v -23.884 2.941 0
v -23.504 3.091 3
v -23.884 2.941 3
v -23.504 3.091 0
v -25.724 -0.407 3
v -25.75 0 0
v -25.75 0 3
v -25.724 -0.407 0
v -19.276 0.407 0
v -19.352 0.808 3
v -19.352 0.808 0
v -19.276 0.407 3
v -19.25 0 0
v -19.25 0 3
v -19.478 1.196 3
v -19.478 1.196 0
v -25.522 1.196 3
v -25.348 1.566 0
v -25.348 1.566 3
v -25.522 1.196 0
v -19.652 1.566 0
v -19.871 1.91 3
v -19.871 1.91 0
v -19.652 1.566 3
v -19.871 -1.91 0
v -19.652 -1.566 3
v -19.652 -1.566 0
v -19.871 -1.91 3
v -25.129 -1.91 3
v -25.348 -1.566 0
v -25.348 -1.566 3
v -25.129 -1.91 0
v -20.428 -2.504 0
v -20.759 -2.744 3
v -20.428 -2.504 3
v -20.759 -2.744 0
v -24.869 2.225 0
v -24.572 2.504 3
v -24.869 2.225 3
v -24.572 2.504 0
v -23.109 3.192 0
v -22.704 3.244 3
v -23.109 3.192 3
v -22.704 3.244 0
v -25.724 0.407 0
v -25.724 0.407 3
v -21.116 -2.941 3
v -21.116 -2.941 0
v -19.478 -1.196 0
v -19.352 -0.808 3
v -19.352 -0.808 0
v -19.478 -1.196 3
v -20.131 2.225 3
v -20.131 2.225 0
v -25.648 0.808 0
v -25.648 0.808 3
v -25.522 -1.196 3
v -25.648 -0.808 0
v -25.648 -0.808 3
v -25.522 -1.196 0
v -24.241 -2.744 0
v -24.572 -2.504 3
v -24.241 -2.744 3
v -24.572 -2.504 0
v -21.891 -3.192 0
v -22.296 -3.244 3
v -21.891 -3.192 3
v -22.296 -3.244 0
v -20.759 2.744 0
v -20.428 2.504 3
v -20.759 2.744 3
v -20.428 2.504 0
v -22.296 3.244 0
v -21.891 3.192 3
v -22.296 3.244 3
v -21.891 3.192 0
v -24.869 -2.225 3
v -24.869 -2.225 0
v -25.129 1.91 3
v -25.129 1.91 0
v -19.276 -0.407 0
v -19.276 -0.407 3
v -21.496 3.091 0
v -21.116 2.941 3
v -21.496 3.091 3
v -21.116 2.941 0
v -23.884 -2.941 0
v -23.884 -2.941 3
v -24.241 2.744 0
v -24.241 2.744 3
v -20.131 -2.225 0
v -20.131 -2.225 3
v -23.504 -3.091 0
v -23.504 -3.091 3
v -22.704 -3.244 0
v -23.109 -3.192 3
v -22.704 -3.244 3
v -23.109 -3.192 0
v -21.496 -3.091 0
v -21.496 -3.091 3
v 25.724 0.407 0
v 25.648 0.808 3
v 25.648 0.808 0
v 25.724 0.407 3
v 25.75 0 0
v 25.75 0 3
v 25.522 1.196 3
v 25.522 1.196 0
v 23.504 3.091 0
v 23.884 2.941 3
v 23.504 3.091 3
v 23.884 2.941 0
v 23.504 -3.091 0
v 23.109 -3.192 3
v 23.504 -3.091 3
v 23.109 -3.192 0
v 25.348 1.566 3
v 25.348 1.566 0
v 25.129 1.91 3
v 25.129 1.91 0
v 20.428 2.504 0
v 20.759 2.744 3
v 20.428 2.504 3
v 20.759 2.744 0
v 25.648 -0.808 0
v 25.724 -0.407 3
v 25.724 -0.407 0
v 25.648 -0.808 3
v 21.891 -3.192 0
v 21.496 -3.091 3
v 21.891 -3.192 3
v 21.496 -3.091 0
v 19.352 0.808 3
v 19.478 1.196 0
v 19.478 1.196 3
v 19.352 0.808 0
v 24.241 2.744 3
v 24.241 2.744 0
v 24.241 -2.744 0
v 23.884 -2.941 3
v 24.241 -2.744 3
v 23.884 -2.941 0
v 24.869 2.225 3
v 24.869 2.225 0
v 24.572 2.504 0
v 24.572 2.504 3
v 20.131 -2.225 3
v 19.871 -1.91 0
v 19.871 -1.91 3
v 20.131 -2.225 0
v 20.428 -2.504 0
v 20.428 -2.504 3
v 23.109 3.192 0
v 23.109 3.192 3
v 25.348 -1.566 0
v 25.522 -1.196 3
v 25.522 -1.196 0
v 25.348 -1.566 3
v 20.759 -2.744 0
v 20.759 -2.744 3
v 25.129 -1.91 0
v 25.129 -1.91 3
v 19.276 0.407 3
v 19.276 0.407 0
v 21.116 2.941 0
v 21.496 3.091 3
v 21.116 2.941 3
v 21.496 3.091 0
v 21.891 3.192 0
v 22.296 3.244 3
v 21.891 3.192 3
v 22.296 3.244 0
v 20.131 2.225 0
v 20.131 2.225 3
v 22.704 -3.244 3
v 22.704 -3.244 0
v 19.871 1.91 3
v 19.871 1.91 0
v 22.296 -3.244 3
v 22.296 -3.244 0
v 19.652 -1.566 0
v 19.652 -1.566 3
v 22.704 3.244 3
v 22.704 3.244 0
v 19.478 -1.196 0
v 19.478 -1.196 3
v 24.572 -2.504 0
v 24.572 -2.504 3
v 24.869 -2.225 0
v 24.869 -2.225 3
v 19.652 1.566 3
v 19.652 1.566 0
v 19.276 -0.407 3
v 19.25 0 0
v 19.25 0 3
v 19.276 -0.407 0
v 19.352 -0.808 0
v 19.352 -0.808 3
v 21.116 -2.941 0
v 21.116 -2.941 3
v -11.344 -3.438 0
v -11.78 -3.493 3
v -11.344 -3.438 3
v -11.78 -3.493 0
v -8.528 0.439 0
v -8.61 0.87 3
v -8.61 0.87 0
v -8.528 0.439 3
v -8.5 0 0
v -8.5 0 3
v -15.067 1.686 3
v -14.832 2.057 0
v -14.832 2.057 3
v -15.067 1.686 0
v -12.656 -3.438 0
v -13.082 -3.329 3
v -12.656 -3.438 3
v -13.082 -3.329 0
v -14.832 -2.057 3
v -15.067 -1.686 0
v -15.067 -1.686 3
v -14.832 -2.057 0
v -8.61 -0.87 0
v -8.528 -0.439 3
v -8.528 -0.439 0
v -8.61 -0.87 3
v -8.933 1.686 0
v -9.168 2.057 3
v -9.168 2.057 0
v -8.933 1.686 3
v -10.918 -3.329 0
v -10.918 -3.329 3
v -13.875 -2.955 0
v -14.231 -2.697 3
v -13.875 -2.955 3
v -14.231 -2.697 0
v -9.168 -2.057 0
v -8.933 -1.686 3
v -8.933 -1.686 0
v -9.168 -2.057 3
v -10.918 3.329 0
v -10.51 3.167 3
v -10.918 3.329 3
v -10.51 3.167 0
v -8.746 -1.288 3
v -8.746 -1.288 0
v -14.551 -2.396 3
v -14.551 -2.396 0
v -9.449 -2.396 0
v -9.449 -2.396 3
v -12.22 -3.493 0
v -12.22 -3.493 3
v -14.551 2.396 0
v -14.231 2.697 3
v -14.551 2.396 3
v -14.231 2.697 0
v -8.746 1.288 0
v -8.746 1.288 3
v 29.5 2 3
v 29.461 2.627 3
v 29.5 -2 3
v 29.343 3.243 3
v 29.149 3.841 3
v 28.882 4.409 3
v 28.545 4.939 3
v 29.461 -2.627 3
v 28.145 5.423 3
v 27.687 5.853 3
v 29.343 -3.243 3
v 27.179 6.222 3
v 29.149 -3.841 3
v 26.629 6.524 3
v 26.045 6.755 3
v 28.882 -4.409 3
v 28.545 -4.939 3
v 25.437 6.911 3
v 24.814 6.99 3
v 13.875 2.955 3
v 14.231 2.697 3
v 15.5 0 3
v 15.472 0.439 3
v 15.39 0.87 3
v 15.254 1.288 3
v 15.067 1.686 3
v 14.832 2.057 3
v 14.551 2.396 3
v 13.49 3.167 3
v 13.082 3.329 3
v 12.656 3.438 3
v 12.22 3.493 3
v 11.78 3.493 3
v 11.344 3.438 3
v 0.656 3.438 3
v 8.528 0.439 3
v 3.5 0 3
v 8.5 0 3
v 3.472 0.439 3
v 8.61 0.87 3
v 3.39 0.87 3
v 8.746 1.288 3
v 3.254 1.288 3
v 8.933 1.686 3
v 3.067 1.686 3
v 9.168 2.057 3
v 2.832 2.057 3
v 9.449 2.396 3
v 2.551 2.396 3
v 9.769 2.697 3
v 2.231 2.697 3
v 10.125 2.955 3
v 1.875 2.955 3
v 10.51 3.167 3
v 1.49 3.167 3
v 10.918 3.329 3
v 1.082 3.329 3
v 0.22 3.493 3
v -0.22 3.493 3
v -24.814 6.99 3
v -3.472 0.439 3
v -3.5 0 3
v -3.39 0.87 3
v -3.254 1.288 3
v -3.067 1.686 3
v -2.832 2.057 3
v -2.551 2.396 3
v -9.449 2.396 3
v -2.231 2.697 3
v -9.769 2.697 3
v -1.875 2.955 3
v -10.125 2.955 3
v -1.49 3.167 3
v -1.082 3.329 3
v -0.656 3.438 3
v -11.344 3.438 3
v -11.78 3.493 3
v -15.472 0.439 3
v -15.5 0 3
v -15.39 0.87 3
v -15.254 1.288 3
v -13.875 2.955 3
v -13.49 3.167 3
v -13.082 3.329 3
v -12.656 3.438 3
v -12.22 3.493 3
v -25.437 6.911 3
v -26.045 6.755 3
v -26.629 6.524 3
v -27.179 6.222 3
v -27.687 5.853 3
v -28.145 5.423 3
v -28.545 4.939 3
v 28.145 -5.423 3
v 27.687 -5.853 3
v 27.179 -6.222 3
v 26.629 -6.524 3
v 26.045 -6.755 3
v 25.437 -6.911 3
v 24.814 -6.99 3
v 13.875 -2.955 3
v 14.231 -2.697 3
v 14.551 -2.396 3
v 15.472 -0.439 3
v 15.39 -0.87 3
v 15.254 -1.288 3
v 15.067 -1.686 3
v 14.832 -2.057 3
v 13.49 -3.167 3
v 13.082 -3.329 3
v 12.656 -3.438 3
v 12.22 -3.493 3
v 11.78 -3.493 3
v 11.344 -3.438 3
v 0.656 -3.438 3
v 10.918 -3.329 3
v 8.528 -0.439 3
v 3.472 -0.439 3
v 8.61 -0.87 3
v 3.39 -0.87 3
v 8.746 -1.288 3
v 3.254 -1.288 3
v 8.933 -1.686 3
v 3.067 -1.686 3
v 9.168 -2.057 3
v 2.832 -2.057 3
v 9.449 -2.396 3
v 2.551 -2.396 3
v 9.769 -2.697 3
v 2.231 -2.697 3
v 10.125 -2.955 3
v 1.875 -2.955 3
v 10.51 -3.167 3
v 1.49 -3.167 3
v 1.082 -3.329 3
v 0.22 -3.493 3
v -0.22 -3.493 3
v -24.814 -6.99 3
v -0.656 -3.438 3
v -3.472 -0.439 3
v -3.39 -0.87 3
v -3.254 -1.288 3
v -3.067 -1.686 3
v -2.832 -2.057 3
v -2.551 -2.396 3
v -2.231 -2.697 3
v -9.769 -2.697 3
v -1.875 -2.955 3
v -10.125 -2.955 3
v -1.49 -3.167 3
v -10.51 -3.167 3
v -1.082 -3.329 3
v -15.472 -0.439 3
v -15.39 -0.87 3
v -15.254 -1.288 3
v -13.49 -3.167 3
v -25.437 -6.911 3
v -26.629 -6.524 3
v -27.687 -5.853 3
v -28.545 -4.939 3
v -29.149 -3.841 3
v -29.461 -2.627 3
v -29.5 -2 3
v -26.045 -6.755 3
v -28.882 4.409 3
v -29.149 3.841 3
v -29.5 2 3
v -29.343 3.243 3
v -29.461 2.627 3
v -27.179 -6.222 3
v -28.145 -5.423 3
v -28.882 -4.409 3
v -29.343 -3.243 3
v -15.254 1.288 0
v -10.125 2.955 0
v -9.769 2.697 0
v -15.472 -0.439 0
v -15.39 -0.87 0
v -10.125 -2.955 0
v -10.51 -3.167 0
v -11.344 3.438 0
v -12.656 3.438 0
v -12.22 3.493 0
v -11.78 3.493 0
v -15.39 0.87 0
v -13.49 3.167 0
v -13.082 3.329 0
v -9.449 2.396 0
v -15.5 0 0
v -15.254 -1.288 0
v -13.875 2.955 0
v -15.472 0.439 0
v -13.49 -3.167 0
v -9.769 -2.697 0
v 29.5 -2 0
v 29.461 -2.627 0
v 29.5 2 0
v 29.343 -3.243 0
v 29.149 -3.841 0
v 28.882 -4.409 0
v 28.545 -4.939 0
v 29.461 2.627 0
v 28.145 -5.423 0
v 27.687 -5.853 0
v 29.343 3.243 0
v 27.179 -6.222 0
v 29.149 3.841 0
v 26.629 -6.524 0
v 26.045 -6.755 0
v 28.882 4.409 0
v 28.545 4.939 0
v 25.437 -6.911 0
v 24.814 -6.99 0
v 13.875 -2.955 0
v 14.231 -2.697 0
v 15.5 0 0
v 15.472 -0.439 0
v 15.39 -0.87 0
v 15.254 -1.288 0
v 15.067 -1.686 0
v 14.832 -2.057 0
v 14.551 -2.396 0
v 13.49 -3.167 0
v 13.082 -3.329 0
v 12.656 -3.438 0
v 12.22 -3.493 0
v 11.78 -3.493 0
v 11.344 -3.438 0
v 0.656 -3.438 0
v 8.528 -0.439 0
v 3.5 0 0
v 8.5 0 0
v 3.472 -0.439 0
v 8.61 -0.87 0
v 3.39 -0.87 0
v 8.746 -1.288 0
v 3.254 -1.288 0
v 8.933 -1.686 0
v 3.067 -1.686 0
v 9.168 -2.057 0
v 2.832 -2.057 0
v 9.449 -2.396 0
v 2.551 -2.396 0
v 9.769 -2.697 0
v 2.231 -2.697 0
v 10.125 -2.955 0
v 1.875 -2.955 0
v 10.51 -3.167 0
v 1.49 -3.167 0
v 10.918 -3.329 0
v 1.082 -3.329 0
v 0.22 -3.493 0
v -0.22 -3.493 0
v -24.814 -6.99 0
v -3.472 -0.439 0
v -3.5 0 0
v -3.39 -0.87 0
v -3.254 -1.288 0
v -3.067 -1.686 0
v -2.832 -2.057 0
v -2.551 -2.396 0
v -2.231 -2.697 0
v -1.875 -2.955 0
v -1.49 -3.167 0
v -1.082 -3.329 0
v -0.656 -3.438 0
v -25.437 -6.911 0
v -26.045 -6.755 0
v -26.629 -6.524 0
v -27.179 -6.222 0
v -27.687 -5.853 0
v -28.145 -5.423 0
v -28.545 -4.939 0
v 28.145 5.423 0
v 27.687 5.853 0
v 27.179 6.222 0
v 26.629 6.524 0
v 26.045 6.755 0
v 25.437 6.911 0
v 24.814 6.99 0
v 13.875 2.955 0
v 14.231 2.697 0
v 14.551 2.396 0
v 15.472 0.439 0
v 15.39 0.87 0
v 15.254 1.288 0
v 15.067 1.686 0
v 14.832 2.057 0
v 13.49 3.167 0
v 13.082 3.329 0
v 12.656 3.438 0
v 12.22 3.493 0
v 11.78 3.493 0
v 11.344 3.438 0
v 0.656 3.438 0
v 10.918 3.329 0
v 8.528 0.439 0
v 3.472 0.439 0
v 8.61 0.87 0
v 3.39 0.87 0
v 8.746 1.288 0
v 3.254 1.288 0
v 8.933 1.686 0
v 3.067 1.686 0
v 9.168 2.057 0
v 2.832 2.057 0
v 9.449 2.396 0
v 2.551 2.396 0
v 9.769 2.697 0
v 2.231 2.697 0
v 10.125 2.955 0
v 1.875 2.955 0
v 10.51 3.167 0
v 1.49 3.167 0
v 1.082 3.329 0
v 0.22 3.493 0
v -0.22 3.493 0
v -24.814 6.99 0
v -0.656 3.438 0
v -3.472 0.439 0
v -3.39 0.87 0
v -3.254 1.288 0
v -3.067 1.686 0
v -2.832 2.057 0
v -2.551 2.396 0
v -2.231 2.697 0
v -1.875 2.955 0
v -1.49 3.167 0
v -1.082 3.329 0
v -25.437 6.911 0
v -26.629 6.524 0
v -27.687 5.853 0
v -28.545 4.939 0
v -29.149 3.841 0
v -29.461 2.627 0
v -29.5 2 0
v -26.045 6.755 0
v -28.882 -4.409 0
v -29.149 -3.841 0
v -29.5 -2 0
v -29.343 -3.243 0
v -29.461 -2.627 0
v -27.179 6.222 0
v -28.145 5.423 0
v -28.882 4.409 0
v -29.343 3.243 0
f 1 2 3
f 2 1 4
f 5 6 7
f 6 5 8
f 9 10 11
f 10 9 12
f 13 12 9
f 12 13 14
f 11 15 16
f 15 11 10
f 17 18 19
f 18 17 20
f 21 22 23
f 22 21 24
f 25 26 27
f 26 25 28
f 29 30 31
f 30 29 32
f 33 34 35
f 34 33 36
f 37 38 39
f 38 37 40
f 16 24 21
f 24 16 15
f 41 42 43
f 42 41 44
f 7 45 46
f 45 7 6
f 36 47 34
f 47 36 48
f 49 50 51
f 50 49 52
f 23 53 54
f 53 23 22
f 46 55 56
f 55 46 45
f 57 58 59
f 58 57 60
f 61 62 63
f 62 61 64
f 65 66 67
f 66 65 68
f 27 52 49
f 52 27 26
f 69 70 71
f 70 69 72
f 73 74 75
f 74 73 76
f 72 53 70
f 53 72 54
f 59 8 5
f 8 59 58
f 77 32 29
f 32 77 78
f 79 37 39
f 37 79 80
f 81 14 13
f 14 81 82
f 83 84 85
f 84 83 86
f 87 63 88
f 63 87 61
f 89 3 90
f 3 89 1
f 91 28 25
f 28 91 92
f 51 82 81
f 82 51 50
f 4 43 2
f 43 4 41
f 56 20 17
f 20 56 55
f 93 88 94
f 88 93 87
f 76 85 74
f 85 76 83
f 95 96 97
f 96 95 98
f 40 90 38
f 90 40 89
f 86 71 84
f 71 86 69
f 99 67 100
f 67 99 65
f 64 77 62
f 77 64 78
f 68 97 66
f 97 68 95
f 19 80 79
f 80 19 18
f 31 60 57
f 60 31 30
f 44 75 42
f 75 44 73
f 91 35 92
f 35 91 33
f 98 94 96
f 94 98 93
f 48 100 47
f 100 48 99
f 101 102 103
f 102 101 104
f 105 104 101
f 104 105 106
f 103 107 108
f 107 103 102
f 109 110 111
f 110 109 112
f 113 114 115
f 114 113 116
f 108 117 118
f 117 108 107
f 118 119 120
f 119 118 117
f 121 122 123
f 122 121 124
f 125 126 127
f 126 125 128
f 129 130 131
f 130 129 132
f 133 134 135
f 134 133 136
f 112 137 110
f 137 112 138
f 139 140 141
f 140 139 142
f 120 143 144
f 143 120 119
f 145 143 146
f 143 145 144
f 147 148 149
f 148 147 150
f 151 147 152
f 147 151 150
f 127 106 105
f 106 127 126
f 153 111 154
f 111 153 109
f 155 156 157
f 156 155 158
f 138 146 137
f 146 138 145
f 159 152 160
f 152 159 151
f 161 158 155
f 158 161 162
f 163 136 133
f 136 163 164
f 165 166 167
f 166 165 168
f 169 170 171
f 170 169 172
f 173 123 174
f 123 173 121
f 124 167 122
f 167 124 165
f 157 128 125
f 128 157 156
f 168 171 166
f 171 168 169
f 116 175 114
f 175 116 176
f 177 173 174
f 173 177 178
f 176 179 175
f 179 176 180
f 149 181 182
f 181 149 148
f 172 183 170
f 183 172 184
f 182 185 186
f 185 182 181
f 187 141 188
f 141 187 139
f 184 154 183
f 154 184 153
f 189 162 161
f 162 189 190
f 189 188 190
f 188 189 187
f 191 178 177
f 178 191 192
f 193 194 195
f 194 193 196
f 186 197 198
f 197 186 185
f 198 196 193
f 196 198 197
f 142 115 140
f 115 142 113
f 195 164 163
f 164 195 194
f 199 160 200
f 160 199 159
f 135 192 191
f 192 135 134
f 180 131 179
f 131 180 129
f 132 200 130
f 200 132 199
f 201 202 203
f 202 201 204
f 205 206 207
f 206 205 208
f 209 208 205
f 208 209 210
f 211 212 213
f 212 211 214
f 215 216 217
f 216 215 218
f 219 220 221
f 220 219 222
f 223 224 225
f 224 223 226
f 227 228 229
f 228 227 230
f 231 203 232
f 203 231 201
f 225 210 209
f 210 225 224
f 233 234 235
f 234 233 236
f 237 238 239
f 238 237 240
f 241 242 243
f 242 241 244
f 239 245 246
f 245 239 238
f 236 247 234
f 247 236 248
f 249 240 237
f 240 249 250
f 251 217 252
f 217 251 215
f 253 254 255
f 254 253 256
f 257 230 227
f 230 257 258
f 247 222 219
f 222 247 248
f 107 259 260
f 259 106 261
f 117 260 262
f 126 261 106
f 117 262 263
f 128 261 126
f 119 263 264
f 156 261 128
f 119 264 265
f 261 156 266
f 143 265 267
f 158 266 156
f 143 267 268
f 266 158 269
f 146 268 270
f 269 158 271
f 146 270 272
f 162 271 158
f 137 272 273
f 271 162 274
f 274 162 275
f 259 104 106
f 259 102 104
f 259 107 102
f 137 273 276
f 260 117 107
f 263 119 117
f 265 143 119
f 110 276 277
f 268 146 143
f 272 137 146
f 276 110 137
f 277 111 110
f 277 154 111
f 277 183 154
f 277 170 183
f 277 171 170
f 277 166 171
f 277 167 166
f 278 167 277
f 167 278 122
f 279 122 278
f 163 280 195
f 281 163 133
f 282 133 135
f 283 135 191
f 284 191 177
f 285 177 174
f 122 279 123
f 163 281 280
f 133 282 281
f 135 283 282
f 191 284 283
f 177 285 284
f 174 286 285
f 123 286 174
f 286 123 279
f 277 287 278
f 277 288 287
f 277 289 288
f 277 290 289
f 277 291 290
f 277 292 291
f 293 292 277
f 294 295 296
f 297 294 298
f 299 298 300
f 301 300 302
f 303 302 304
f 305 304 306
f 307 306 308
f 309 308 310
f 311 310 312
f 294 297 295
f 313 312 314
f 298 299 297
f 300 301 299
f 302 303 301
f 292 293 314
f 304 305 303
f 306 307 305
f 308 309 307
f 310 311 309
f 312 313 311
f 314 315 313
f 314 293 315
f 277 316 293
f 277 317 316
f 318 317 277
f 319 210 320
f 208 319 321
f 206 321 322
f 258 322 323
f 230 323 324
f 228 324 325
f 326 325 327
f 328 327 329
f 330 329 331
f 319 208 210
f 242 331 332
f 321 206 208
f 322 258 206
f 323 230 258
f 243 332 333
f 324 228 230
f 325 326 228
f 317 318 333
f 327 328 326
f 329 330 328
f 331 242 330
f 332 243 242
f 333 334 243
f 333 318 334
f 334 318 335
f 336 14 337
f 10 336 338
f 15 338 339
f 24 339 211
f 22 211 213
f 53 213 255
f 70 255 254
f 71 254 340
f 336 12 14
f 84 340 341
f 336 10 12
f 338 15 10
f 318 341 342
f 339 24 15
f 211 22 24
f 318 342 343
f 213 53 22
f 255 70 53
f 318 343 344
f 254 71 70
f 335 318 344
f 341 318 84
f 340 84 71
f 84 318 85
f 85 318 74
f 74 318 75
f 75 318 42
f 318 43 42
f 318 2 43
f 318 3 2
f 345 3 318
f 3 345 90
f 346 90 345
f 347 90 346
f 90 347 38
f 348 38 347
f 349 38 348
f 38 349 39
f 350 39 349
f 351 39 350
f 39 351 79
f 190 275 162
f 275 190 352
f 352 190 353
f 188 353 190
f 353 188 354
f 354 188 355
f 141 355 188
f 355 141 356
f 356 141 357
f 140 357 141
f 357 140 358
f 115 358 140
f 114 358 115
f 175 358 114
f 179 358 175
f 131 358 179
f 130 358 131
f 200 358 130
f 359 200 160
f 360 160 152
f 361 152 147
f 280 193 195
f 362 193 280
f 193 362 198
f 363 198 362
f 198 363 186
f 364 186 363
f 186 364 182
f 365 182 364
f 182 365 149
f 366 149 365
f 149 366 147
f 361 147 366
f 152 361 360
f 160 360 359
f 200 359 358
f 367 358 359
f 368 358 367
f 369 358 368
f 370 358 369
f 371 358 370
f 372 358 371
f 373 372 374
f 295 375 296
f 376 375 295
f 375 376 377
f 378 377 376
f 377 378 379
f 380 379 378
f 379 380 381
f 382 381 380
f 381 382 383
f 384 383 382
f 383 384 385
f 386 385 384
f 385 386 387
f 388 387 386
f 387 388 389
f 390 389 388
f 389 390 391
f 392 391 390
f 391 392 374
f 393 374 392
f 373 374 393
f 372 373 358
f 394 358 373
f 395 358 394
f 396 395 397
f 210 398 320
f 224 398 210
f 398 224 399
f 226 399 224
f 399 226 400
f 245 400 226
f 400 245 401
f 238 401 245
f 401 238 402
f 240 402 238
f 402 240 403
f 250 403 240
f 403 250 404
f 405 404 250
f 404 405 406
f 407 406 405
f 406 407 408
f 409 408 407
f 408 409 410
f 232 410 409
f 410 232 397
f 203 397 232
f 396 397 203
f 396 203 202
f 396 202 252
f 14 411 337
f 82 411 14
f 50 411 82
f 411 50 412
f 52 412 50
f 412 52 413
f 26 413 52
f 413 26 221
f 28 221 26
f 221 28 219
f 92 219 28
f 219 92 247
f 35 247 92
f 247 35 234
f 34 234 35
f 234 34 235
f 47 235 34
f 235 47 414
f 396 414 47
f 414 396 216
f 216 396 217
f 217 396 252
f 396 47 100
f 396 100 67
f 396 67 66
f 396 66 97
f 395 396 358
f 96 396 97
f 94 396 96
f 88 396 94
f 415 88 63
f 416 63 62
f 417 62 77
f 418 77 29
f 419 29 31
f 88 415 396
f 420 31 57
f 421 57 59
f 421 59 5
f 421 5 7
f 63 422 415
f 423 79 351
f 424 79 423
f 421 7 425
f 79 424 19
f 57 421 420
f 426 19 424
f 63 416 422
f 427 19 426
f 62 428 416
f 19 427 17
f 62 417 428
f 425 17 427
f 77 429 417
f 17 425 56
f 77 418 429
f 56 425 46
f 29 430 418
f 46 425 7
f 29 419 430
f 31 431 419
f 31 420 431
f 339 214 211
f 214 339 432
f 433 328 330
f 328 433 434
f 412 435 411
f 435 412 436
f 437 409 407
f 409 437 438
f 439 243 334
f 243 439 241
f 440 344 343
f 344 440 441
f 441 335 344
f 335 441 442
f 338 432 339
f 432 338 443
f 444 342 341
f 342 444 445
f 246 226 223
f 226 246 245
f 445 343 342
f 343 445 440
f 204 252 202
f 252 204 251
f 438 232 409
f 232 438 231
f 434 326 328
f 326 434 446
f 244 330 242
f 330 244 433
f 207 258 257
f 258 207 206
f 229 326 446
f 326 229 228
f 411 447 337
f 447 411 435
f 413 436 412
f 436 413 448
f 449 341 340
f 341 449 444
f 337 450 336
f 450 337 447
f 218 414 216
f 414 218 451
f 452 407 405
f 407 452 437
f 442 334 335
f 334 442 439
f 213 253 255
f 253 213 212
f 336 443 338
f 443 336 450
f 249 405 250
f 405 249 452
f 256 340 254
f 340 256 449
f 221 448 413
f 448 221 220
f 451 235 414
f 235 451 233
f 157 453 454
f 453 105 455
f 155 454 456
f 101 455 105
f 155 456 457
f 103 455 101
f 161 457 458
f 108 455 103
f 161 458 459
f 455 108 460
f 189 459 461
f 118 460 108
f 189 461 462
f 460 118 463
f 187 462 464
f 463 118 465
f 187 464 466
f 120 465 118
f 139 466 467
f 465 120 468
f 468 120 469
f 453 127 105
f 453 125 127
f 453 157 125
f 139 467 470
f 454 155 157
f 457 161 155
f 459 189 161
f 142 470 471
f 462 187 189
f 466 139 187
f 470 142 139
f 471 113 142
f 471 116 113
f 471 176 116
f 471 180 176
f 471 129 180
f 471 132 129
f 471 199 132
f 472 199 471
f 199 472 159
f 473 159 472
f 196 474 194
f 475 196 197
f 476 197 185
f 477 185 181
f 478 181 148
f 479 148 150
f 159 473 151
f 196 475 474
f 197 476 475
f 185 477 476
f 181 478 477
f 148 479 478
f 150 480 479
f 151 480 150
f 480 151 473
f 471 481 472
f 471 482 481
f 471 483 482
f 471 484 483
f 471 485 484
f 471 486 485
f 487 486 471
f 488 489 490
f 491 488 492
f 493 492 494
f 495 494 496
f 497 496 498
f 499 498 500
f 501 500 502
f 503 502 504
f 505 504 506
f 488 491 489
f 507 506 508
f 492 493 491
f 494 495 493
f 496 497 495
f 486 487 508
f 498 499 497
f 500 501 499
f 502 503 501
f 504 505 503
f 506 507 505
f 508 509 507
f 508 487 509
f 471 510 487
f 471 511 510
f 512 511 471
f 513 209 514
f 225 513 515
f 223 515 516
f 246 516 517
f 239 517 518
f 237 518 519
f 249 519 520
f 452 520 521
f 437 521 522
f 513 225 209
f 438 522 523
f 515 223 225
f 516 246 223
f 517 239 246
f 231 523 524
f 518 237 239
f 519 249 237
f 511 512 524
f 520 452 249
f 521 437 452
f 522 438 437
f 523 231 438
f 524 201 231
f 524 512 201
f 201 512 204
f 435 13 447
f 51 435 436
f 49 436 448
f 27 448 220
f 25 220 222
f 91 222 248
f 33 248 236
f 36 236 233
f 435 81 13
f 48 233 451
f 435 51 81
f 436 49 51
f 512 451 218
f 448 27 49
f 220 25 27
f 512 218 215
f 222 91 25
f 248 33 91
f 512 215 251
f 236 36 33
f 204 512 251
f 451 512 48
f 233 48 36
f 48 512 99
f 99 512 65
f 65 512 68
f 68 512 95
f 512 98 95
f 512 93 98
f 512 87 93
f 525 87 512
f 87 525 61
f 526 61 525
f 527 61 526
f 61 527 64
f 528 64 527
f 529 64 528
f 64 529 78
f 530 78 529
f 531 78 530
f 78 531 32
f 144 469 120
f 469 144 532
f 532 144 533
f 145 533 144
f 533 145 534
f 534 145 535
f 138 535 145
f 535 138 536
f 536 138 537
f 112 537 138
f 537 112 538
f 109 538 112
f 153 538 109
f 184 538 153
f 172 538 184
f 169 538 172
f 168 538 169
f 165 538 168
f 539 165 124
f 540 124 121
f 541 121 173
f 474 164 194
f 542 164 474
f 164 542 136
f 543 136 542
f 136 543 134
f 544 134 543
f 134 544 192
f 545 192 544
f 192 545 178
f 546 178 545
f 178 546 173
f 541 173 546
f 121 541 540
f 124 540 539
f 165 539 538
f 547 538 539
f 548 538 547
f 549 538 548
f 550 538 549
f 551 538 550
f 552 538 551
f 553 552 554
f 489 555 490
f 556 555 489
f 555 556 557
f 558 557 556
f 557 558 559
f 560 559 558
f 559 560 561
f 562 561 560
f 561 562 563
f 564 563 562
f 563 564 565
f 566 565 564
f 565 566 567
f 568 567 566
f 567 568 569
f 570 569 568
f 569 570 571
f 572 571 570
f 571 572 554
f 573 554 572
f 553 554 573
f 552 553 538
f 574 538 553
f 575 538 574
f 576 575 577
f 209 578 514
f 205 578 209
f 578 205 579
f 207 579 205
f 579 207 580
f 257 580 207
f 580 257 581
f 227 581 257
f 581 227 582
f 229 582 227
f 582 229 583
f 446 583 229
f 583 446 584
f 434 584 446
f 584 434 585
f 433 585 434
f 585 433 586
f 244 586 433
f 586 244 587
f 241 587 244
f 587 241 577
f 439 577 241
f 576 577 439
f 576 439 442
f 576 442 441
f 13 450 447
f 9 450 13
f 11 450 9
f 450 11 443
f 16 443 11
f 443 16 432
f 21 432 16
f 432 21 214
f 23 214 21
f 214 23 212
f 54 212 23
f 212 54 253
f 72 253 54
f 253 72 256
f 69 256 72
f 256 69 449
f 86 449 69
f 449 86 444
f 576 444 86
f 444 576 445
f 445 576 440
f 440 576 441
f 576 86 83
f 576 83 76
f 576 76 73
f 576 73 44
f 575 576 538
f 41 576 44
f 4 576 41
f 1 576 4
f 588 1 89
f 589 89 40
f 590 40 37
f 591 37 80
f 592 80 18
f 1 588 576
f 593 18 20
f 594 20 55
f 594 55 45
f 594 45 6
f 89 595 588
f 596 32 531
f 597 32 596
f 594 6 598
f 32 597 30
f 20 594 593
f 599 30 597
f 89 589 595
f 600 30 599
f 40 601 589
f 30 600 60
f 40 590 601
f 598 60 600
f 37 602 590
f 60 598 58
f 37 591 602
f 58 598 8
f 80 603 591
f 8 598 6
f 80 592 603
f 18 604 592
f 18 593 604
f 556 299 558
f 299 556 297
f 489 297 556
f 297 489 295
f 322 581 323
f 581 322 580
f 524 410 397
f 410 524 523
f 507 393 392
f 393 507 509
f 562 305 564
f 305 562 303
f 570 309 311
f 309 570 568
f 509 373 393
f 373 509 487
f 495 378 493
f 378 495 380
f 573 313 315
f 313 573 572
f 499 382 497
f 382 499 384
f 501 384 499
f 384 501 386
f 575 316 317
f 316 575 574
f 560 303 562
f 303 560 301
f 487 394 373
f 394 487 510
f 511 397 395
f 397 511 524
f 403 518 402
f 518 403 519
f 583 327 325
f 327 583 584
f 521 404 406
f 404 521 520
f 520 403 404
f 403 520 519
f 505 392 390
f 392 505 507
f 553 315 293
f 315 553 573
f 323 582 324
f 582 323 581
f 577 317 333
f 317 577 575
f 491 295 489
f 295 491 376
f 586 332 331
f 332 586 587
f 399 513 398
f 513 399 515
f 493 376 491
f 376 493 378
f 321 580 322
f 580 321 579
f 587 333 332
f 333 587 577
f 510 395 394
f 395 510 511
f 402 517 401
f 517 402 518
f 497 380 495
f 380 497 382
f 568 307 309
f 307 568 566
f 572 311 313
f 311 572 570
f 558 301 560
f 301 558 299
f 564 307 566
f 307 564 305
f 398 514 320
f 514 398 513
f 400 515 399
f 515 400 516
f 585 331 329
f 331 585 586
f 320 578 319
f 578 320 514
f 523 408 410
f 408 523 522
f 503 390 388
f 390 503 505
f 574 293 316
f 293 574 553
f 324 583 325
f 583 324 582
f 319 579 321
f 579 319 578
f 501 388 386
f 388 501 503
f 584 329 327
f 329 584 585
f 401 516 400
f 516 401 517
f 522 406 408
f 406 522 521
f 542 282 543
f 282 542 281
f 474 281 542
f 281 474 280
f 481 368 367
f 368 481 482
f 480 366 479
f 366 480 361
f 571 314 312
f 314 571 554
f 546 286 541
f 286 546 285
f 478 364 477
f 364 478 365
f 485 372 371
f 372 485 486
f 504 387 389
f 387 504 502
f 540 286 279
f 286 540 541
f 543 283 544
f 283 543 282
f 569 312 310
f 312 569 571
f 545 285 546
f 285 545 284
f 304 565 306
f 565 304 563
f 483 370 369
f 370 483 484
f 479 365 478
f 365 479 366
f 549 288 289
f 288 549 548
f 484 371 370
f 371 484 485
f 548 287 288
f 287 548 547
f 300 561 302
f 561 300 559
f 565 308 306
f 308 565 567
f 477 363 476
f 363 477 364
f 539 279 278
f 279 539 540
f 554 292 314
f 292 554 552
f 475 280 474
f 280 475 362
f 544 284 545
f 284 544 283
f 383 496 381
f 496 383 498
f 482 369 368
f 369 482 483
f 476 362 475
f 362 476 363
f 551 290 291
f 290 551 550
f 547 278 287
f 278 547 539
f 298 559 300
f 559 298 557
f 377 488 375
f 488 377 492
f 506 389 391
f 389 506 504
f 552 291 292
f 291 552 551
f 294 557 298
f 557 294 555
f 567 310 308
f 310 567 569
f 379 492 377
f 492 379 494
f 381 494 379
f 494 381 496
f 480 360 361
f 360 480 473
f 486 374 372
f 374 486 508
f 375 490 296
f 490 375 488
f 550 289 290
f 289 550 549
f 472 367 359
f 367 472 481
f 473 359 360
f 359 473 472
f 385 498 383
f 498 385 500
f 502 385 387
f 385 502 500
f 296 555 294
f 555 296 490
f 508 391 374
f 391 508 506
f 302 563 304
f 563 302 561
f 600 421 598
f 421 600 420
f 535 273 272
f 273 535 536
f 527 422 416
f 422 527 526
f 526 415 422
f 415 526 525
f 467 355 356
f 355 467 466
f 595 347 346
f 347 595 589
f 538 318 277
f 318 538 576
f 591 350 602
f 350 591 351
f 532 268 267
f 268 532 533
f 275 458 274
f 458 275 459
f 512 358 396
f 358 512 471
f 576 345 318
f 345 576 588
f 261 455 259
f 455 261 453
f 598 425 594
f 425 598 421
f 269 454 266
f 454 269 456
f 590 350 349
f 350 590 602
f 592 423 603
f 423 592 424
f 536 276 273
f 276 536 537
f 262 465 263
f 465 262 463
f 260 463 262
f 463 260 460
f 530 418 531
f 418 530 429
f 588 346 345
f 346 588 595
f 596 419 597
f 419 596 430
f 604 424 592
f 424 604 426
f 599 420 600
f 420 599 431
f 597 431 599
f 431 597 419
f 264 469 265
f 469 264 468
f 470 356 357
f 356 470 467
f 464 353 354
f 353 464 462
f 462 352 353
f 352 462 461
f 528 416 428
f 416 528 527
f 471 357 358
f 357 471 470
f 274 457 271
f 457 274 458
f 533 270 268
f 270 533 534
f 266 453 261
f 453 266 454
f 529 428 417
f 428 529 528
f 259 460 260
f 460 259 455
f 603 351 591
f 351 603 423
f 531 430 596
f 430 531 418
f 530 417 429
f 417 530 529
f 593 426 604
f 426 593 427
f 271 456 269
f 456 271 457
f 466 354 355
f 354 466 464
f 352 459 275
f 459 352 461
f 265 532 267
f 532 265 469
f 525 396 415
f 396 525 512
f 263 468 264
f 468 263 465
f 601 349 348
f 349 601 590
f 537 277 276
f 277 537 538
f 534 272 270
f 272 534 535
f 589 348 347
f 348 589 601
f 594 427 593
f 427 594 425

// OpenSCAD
$fn = 50;


difference() {
	union() {
		hull() {
			translate(v = [-24.5000000000, 2.0000000000, 0]) {
				cylinder(h = 3, r = 5);
			}
			translate(v = [24.5000000000, 2.0000000000, 0]) {
				cylinder(h = 3, r = 5);
			}
			translate(v = [-24.5000000000, -2.0000000000, 0]) {
				cylinder(h = 3, r = 5);
			}
			translate(v = [24.5000000000, -2.0000000000, 0]) {
				cylinder(h = 3, r = 5);
			}
		}
	}
	union() {
		#translate(v = [-22.5000000000, 0.0000000000, 0]) {
			cylinder(h = 3, r = 3.2500000000);
		}
		#translate(v = [22.5000000000, 0.0000000000, 0]) {
			cylinder(h = 3, r = 3.2500000000);
		}
		#translate(v = [-22.5000000000, 0.0000000000, -100.0000000000]) {
			cylinder(h = 200, r = 3.2500000000);
		}
		#translate(v = [-22.5000000000, 0.0000000000, -100.0000000000]) {
			cylinder(h = 200, r = 3.2500000000);
		}
		#translate(v = [22.5000000000, 0.0000000000, -100.0000000000]) {
			cylinder(h = 200, r = 3.2500000000);
		}
		#translate(v = [22.5000000000, 0.0000000000, -100.0000000000]) {
			cylinder(h = 200, r = 3.2500000000);
		}
		#translate(v = [-22.5000000000, 0.0000000000, 0]) {
			cylinder(h = 3, r = 1.8000000000);
		}
		#translate(v = [22.5000000000, 0.0000000000, 0]) {
			cylinder(h = 3, r = 1.8000000000);
		}
		#translate(v = [-22.5000000000, 0.0000000000, 0]) {
			cylinder(h = 3, r = 1.8000000000);
		}
		#translate(v = [22.5000000000, 0.0000000000, 0]) {
			cylinder(h = 3, r = 1.8000000000);
		}
		#translate(v = [-22.5000000000, 0.0000000000, 0]) {
			cylinder(h = 3, r = 1.8000000000);
		}
		#translate(v = [22.5000000000, 0.0000000000, 0]) {
			cylinder(h = 3, r = 1.8000000000);
		}
		#translate(v = [-12.0000000000, 0, 0]) {
			cylinder(h = 3, r = 3.5000000000);
		}
		#cylinder(h = 3, r = 3.5000000000);
		#translate(v = [12.0000000000, 0, 0]) {
			cylinder(h = 3, r = 3.5000000000);
		}
	}
}
